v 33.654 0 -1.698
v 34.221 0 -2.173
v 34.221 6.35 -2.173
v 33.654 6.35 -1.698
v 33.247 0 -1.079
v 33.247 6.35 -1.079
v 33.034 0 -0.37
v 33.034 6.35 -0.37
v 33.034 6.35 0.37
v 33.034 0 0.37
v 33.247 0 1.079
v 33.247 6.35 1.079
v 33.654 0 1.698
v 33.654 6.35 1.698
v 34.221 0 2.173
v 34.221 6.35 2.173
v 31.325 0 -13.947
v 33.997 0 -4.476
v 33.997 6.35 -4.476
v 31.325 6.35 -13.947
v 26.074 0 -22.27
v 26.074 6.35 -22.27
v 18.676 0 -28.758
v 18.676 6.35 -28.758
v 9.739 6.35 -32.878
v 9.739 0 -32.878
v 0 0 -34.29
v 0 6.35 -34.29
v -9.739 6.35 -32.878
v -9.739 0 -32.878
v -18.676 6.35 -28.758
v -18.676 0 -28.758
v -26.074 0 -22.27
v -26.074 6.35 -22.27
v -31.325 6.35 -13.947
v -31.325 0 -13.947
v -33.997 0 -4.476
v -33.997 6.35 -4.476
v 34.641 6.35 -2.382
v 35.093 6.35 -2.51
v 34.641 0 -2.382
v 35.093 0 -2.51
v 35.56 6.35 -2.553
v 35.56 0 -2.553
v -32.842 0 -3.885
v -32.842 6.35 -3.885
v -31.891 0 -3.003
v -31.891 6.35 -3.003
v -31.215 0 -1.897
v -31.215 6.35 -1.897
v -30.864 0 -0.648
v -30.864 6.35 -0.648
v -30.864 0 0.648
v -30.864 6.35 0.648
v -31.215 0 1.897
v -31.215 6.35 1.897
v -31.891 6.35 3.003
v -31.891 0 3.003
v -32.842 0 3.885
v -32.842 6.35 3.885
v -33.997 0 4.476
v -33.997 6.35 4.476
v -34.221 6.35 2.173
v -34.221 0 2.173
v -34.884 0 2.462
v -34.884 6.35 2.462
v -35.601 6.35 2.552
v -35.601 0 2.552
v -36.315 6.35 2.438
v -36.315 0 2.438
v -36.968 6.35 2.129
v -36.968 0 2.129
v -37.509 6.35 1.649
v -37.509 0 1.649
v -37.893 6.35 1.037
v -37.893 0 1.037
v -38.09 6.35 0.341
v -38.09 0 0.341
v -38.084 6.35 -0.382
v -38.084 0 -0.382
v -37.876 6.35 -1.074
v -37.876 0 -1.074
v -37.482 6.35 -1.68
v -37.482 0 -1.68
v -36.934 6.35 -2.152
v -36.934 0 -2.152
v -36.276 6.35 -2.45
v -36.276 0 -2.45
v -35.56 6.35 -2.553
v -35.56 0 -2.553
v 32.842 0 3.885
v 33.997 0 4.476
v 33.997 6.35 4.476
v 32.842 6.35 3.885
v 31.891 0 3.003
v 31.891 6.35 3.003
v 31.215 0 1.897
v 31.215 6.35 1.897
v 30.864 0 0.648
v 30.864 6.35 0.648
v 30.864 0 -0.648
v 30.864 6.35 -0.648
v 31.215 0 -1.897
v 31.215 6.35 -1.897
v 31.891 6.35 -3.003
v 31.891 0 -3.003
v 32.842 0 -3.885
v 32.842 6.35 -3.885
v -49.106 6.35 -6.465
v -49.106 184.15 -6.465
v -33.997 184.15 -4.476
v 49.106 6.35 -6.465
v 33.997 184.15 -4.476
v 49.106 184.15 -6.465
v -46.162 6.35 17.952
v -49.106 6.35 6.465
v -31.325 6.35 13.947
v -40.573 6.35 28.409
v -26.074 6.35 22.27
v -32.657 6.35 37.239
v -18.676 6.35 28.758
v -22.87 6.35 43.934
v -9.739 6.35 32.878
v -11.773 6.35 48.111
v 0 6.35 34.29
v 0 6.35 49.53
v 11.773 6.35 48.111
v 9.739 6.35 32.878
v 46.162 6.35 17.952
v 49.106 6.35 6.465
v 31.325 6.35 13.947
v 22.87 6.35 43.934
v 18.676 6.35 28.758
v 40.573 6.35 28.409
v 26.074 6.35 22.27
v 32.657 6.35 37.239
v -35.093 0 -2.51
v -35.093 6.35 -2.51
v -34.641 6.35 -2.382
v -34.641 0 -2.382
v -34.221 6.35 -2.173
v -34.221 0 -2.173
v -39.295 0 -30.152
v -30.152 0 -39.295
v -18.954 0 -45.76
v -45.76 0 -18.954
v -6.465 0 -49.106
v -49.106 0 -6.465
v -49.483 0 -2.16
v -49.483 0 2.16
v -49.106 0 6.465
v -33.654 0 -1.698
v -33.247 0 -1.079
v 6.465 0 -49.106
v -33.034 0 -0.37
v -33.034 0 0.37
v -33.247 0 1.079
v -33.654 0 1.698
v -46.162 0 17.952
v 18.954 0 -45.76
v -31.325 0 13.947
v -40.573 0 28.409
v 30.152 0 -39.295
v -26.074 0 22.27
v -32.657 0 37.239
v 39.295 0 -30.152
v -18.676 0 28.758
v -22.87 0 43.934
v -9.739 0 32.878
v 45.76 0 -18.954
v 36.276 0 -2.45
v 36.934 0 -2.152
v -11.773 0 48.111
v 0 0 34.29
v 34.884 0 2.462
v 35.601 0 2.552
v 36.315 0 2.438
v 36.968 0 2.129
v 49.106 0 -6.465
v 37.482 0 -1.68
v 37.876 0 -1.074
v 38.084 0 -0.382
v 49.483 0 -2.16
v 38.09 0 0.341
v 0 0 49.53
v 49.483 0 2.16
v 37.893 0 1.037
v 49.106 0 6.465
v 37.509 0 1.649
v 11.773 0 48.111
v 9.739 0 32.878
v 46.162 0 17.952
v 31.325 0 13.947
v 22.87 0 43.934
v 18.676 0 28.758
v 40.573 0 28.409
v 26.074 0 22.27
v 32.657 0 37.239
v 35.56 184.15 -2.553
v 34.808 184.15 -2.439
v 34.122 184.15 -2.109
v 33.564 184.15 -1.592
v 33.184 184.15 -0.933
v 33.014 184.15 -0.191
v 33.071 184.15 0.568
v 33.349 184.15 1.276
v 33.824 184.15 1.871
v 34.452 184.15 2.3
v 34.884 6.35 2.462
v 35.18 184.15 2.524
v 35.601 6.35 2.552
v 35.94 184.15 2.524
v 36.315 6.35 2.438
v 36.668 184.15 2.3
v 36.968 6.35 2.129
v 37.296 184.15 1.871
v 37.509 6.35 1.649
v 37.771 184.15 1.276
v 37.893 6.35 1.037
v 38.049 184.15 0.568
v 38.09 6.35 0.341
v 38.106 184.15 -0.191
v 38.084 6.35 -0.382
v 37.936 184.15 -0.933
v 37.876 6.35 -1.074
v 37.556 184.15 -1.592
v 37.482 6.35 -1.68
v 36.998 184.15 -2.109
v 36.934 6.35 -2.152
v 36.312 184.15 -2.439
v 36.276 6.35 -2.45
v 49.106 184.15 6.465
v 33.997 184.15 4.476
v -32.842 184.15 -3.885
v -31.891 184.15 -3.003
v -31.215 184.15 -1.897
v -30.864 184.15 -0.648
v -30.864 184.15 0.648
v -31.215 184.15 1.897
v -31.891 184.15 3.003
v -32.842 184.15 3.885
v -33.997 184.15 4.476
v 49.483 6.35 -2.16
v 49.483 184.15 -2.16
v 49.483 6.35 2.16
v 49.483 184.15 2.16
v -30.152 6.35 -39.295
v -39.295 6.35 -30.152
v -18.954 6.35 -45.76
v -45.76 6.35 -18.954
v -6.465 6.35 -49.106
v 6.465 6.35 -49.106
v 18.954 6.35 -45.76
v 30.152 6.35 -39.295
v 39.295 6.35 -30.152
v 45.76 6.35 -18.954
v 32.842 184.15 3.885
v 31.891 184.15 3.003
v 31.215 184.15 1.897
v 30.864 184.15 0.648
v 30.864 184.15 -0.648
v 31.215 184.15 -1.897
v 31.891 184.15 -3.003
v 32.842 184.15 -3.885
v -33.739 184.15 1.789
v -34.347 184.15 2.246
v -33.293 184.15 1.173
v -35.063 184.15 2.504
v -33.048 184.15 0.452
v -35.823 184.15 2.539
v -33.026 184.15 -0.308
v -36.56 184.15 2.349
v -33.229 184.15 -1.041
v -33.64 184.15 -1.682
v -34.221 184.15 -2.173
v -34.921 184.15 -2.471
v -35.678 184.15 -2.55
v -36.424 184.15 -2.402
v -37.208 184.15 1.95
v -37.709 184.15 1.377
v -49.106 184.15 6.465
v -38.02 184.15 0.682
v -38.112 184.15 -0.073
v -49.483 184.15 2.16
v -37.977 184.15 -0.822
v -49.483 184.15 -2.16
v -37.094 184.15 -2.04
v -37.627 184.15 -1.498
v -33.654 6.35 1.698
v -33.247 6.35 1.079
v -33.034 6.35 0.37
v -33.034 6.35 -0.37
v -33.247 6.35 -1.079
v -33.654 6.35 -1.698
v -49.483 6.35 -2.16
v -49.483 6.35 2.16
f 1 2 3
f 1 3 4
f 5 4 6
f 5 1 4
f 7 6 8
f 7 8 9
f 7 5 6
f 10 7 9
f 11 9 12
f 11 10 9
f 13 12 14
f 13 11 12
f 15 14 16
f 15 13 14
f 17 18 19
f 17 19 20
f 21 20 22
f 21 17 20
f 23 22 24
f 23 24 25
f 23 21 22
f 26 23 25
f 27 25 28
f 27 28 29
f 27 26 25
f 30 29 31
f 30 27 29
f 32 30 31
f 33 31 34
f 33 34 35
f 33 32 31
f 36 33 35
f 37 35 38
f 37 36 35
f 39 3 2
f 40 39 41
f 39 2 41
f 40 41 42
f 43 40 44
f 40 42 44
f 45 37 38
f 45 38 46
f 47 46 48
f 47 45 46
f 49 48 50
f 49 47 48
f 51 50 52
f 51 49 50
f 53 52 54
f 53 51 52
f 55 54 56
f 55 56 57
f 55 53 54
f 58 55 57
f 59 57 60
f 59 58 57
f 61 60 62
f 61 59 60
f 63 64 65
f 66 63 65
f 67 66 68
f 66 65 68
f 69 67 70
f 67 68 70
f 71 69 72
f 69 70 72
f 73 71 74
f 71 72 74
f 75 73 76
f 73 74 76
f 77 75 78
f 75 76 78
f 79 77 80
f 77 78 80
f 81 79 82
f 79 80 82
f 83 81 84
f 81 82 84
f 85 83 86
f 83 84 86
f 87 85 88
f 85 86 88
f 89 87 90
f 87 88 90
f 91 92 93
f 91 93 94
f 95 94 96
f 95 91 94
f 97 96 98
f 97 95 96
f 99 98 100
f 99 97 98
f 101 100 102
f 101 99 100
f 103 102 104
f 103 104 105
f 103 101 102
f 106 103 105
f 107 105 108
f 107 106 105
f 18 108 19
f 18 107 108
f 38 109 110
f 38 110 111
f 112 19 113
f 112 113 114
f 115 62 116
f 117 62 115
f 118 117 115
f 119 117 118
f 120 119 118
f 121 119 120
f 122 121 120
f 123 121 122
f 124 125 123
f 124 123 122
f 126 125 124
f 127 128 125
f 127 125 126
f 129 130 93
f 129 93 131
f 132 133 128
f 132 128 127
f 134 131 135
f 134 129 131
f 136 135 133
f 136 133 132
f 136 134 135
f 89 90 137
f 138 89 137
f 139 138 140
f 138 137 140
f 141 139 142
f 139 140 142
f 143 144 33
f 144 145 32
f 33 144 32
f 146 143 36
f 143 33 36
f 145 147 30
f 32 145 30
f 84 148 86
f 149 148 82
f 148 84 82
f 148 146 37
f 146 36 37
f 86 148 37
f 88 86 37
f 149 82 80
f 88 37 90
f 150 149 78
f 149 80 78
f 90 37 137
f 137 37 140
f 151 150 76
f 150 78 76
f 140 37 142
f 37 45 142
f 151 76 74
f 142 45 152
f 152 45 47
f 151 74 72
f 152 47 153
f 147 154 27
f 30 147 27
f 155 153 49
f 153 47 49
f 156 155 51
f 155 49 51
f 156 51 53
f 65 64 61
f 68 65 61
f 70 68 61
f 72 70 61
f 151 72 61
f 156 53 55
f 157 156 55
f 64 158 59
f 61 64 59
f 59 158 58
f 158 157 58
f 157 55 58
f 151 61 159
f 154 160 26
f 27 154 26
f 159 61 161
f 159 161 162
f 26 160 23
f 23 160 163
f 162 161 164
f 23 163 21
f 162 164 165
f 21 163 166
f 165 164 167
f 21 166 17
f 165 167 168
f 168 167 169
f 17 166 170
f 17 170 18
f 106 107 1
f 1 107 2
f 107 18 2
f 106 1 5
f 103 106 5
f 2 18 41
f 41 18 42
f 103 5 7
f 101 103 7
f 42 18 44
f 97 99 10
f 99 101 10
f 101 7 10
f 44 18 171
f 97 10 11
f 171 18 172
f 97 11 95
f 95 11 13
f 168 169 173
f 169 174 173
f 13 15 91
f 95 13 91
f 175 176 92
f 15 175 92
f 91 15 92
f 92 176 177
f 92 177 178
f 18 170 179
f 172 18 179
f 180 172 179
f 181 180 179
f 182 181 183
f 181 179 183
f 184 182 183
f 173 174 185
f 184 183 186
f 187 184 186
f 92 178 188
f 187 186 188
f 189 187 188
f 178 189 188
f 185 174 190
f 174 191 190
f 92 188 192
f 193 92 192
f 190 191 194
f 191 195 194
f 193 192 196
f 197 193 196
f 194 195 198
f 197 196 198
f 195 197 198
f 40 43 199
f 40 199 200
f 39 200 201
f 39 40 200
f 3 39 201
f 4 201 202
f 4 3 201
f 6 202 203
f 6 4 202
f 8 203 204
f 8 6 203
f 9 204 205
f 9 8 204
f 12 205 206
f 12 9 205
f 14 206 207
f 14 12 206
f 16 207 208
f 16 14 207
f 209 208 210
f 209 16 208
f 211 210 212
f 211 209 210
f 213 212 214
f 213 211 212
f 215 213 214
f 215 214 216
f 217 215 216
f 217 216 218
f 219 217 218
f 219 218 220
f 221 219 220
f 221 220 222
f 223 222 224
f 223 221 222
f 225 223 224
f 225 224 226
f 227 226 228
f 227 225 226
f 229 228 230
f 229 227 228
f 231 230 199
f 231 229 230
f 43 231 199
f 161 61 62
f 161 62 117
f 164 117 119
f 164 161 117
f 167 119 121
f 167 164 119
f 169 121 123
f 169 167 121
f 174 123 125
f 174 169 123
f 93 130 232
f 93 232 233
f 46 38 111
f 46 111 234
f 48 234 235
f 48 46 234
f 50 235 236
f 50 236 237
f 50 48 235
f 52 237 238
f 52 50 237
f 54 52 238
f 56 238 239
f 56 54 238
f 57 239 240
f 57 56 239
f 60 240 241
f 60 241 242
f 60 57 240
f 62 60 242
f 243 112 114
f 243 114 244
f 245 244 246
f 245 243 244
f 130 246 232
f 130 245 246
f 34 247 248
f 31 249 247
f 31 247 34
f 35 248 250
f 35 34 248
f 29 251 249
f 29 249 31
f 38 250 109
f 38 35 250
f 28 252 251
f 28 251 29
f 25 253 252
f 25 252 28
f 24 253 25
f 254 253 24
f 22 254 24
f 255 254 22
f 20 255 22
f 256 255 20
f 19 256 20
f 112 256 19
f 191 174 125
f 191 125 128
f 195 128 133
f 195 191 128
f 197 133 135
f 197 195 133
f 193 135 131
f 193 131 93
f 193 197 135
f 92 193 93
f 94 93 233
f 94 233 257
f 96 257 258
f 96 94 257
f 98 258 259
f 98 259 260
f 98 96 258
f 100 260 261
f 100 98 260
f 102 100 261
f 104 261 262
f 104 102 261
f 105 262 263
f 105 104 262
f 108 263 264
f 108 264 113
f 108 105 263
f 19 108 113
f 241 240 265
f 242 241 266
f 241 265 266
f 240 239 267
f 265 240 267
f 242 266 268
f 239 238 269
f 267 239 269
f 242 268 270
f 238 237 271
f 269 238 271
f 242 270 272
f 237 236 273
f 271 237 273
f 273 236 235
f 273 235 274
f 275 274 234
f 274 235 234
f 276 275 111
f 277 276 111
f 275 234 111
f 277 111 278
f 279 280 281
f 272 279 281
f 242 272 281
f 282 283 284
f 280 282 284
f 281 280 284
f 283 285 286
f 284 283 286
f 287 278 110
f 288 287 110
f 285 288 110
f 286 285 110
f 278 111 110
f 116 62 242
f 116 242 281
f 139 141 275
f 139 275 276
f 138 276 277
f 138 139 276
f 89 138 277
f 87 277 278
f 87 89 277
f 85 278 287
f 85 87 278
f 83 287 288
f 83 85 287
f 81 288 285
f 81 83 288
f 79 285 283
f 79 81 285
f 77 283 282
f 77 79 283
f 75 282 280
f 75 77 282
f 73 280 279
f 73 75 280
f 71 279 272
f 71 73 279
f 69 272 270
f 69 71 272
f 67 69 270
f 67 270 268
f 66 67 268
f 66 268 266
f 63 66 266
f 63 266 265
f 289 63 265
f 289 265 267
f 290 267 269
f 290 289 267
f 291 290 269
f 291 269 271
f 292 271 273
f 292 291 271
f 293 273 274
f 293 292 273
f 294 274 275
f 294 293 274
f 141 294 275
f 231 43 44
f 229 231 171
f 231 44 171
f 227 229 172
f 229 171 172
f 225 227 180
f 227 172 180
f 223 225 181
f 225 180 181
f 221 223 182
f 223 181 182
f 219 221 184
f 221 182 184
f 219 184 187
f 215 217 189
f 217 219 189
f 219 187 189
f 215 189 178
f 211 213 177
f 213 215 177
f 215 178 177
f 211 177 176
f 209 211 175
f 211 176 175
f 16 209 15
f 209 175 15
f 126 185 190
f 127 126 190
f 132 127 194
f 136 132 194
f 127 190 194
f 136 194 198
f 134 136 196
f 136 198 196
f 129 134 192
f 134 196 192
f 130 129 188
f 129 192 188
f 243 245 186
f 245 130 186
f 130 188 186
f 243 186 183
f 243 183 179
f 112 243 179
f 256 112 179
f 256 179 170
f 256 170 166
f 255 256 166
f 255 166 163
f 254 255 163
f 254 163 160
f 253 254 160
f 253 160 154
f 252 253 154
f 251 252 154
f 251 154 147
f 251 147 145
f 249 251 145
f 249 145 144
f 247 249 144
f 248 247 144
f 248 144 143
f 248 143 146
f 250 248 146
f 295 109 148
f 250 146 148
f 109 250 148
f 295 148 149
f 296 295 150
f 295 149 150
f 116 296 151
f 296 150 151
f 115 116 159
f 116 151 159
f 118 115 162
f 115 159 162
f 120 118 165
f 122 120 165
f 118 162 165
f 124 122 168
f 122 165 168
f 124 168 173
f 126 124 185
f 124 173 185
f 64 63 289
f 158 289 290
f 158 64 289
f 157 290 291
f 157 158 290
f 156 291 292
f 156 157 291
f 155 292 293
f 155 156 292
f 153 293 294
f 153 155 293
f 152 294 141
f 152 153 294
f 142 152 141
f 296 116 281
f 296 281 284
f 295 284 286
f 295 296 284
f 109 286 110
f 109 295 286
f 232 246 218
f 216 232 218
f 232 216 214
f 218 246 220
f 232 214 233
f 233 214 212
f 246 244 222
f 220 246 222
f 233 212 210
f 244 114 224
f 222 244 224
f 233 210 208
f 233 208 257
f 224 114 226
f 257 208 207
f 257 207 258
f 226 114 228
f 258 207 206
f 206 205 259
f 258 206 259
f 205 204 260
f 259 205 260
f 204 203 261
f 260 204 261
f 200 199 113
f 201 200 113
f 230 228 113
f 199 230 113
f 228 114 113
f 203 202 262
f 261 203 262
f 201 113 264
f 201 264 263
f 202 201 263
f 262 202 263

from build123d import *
from build123d.topology import SkipClean

# Parameters (mm, degrees)
SKETCH1_R           = 49.53
SKETCH1_R_2         = 34.29
BOSS_EXTRUDE1_DEPTH = 6.35
SKETCH2_R           = 2.5527
BOSS_EXTRUDE2_DEPTH = 177.8
SKETCH5_R           = 2.5527
CUT_EXTRUDE1_DEPTH  = 6.35
BOSS_EXTRUDE3_START = -6.35
SKETCH2_3_R         = 2.5527
BOSS_EXTRUDE3_DEPTH = 6.35


with BuildPart() as part:
    # Sketch1 → Boss-Extrude1 (new body)
    with BuildSketch(Plane(origin=(0, 0, 0), x_dir=(1, 0, 0), z_dir=(0, 1, 0))):
        Circle(SKETCH1_R)
        Circle(SKETCH1_R_2, mode=Mode.SUBTRACT)
    extrude(amount=BOSS_EXTRUDE1_DEPTH)

    # Sketch2 → Boss-Extrude2 (add)
    # profile 1 of 2: a face of its own
    with SkipClean():  # the faces are left unmerged after this step: merging them gives an invalid solid
        with BuildSketch(Plane(origin=(0, 6.35, 0), x_dir=(1, 0, 0), z_dir=(0, 1, 0))):
            with BuildLine():
                Line((-49.106264, 6.464962), (-33.996644, 4.475743))
                ThreePointArc((-33.996644, 4.475743), (-30.819076, 0), (-33.996644, -4.475743))
                Line((-33.996644, -4.475743), (-49.106264, -6.464962))
                ThreePointArc((-49.106264, -6.464962), (-49.53, 0), (-49.106264, 6.464962))
            make_face()
            with Locations((-35.56, 0)):
                Circle(SKETCH2_R, mode=Mode.SUBTRACT)
        # profile 2 of 2: a face of its own
        with BuildSketch(Plane(origin=(0, 6.35, 0), x_dir=(1, 0, 0), z_dir=(0, 1, 0))):
            with BuildLine():
                Line((33.996644, 4.475743), (49.106264, 6.464962))
                ThreePointArc((49.106264, 6.464962), (49.53, 0), (49.106264, -6.464962))
                Line((49.106264, -6.464962), (33.996644, -4.475743))
                ThreePointArc((33.996644, -4.475743), (30.819076, 0), (33.996644, 4.475743))
            make_face()
            with Locations((35.56, 0)):
                Circle(SKETCH2_R, mode=Mode.SUBTRACT)
        extrude(amount=BOSS_EXTRUDE2_DEPTH)

    # Sketch5 → Cut-Extrude1 (cut)
    with SkipClean():  # the faces are left unmerged after this step: merging them gives an invalid solid
        with BuildSketch(Plane.XZ):
            with Locations((-35.56, 0)):
                Circle(SKETCH5_R)
            with Locations((35.56, 0)):
                Circle(SKETCH5_R)
        extrude(amount=-CUT_EXTRUDE1_DEPTH, mode=Mode.SUBTRACT)

    # Sketch2<3> → Boss-Extrude3 (add)
    # profile 1 of 2: a face of its own
    with BuildSketch(Plane(origin=(0, 6.35, 0), x_dir=(1, 0, 0), z_dir=(0, 1, 0)).offset(BOSS_EXTRUDE3_START)):
        with BuildLine():
            Line((-49.106264, 6.464962), (-33.996644, 4.475743))
            ThreePointArc((-33.996644, 4.475743), (-30.819076, 0), (-33.996644, -4.475743))
            Line((-33.996644, -4.475743), (-49.106264, -6.464962))
            ThreePointArc((-49.106264, -6.464962), (-49.53, 0), (-49.106264, 6.464962))
        make_face()
        with Locations((-35.56, 0)):
            Circle(SKETCH2_3_R, mode=Mode.SUBTRACT)
    # profile 2 of 2: a face of its own
    with BuildSketch(Plane(origin=(0, 6.35, 0), x_dir=(1, 0, 0), z_dir=(0, 1, 0)).offset(BOSS_EXTRUDE3_START)):
        with BuildLine():
            Line((33.996644, 4.475743), (49.106264, 6.464962))
            ThreePointArc((49.106264, 6.464962), (49.53, 0), (49.106264, -6.464962))
            Line((49.106264, -6.464962), (33.996644, -4.475743))
            ThreePointArc((33.996644, -4.475743), (30.819076, 0), (33.996644, 4.475743))
        make_face()
        with Locations((35.56, 0)):
            Circle(SKETCH2_3_R, mode=Mode.SUBTRACT)
    extrude(amount=BOSS_EXTRUDE3_DEPTH)


solid = part.part
